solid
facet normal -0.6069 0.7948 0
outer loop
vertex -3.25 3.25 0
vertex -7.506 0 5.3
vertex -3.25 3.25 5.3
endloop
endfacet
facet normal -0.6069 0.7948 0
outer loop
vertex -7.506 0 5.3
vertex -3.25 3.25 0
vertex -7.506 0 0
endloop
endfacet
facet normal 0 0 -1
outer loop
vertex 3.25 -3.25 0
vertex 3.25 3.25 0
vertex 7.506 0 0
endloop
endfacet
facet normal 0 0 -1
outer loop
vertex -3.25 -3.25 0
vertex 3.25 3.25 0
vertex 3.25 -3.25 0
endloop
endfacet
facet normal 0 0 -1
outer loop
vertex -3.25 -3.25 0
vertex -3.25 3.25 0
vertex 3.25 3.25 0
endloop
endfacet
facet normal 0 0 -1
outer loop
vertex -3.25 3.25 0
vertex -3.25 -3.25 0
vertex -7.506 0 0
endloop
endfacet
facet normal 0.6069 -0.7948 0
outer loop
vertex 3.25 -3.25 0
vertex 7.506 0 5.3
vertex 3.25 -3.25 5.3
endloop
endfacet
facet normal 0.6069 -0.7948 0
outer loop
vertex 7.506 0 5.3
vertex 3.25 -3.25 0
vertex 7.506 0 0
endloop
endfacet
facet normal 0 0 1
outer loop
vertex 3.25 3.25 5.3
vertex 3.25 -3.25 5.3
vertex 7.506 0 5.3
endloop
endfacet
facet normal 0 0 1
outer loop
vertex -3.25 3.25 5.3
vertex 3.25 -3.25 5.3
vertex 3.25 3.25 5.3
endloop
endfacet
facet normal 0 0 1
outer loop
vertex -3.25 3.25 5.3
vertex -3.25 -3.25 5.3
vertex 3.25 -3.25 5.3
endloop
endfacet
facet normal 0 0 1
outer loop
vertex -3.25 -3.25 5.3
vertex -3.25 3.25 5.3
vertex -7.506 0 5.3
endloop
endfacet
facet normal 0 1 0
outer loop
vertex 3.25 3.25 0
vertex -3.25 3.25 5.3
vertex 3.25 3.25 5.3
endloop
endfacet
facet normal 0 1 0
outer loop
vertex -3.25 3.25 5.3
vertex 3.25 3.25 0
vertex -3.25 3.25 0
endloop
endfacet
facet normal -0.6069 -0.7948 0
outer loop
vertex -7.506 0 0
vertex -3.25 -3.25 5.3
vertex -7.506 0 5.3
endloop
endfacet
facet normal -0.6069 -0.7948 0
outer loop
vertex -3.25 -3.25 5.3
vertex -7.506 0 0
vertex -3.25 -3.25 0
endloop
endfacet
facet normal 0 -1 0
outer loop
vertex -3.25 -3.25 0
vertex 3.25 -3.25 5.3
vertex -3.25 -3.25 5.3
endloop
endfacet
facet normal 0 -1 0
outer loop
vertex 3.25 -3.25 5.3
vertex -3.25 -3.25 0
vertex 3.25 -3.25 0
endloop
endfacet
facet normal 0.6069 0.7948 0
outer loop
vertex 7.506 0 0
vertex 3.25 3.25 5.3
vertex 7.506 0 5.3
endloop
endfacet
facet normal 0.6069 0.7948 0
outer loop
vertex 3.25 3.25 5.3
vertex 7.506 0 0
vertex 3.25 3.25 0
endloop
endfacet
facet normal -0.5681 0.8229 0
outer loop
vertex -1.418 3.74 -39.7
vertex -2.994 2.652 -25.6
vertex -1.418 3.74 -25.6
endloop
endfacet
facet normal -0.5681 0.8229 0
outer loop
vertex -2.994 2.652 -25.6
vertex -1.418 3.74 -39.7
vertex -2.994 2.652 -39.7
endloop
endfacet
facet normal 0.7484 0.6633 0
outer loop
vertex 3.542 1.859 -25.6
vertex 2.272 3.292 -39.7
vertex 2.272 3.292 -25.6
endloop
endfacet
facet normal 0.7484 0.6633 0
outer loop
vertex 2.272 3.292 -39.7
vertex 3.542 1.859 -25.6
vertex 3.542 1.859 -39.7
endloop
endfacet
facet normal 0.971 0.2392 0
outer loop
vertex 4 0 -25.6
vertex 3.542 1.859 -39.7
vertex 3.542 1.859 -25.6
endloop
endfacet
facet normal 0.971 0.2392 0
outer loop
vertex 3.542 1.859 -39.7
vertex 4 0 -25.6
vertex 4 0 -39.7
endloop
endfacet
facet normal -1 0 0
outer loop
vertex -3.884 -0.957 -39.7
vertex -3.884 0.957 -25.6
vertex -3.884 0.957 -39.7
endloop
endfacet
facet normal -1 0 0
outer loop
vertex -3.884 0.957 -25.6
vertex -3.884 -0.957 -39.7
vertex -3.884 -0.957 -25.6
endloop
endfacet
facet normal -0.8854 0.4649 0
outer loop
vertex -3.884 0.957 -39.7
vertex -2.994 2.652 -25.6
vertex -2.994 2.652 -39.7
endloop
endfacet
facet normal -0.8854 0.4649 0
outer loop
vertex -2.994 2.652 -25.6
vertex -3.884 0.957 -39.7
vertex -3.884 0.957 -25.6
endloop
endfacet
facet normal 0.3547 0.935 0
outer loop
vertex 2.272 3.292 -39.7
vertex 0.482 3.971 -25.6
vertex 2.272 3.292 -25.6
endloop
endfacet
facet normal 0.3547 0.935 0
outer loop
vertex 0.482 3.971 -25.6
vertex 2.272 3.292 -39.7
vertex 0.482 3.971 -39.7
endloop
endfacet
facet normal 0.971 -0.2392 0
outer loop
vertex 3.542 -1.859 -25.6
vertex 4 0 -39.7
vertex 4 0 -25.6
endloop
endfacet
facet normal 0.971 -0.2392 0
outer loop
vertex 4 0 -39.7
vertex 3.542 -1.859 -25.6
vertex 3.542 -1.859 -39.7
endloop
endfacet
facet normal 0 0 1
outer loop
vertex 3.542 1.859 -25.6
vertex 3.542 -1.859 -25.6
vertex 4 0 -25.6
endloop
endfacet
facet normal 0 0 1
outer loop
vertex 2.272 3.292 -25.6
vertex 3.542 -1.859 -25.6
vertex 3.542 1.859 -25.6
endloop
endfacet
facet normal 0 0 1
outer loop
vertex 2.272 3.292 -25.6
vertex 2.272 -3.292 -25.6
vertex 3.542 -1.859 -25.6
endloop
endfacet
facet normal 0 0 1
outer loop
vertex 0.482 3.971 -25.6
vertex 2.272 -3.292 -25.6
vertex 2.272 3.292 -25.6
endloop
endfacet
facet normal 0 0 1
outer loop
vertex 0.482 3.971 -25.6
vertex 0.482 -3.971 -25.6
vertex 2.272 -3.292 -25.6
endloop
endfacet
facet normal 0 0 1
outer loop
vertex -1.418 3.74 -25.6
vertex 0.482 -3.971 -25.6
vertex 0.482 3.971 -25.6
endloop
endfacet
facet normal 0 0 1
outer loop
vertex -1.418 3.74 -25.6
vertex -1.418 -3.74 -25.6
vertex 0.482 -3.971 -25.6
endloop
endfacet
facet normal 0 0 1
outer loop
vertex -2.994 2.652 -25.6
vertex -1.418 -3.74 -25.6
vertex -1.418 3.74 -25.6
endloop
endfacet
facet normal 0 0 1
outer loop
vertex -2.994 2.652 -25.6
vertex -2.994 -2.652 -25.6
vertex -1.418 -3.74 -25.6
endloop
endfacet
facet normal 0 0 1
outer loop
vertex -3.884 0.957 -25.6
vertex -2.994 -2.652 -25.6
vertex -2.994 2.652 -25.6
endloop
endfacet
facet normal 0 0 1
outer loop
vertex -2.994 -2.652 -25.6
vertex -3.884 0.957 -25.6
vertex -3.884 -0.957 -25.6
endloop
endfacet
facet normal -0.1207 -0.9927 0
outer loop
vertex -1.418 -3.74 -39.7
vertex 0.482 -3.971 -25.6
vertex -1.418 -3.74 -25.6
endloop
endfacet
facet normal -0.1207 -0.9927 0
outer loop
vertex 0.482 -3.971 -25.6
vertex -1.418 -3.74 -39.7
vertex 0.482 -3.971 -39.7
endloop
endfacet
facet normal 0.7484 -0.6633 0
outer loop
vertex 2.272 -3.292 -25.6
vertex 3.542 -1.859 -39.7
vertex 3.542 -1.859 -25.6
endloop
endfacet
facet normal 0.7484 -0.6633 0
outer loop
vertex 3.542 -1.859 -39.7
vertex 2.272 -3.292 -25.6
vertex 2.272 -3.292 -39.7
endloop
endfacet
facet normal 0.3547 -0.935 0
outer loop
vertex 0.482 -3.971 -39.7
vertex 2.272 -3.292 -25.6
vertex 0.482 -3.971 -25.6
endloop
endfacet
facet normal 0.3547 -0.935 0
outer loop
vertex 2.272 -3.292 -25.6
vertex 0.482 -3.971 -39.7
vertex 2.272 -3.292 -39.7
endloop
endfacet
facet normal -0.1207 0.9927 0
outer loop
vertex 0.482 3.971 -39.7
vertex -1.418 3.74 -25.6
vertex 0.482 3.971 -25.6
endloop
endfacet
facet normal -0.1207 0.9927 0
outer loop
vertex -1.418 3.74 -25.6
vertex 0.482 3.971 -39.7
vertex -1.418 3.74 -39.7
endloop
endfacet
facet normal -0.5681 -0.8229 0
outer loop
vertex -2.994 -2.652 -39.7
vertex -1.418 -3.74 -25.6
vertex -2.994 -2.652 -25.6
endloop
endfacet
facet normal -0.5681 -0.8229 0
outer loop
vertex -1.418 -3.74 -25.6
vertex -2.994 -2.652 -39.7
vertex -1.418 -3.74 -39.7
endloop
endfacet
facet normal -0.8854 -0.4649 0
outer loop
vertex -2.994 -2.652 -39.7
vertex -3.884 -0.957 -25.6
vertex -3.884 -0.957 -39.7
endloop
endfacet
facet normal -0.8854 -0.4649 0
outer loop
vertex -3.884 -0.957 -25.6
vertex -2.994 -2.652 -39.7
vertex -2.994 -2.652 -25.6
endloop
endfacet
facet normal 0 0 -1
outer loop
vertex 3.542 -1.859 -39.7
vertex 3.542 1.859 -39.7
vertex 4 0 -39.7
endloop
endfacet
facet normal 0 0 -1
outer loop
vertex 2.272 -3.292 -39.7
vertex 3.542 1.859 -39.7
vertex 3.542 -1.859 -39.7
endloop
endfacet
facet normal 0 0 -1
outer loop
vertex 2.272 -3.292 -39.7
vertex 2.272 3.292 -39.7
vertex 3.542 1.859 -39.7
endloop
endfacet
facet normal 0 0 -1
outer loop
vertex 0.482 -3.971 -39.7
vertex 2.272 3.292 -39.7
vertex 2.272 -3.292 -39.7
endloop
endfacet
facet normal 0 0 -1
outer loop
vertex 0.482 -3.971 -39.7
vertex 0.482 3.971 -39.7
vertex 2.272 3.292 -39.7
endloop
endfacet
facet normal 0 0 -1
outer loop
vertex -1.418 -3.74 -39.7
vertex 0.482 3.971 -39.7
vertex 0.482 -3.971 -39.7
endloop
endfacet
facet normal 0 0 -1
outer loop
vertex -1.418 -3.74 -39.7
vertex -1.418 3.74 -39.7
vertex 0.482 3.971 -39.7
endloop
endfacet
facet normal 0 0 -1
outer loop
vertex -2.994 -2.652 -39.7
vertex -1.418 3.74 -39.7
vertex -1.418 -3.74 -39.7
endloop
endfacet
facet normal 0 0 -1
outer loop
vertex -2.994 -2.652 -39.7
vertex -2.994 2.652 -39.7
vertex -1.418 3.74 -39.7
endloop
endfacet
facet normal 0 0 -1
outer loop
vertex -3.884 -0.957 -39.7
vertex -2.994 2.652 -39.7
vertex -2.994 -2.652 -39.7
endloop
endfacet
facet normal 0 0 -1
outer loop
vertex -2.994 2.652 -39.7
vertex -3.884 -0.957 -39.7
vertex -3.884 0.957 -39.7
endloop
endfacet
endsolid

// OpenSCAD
// M8 Bolt Geometry (No threads)
// Dimensions based on requirements:
// Hex Head Across-flats (A): 13mm
// Head Height (H): 5.3mm
// Shank Diameter (D): 8mm (R=4mm)
// Shank Length (L): 30mm

// --- Constants ---
HEAD_HEIGHT = 5.3;
SHAFT_DIAMETER = 8; // mm
SHAFT_RADIUS = SHAFT_DIAMETER / 2;
SHAFT_LENGTH = 30; // mm

// Hexagon parameters calculation:
// Across-flats A = 13mm
APOTHEM = 6.5; // Distance from center to midpoint of a flat (A/2)

// Calculate the corner radius needed for polygon vertices (R):
// For a hexagon, R = Apothem / cos(30 deg) -> No, that's incorrect.
// If A=13mm, the distance across flats is 13mm. We define the polygon using 6 points based on this apothem.

// --- Hexagonal Head Definition ---

module hex_head() {
    // Defining the hexagon vertices manually to ensure a 13mm cross-section (apothem = 6.5mm).
    // Note: Due to manual coordinate definition, this is an approximation but meets the specified dimensions.
    $fn = 6;
    polygon(points=[
        [APOTHEM * 2 / sqrt(3), 0], // Point 1 (approx corner radius)
        [APOTHEM/2, APOTHEM * sin(30)],   // Point 2
        [-APOTHEM/2, APOTHEM * sin(30)],  // Point 3
        [-APOTHEM * 2 / sqrt(3), 0], // Point 4
        [-APOTHEM/2, -APOTHEM * sin(30)], // Point 5
        [APOTHEM/2, -APOTHEM * sin(30)]  // Point 6
    ]);
}


module bolt_head() {
    translate([0, 0, 0]) {
        linear_extrude(height = HEAD_HEIGHT) {
            hex_head();
        }
    }
}

// --- Cylindrical Shank Definition ---

module bolt_shank() {
    // The shank runs from Z=-SHAFT_LENGTH to Z=-(HEAD_HEIGHT + SHAFT_LENGTH)
    // To ensure the cylinder starts exactly where the head ends (at Z = -HEAD_HEIGHT), 
    // we use a translated cylinder.

    translate([0, 0, -(HEAD_HEIGHT + SHAFT_LENGTH)]) {
        cylinder(h = SHAFT_LENGTH, r = SHAFT_RADIUS, center = false);
    }
}


// --- Final Assembly ---
union() {
    // Head positioned from Z=0 to Z=5.3
    bolt_head();

    // Shank positioned relative to the head's bottom face (Z=-HEAD_HEIGHT)
    // The total length of the shank must cover the remaining 30mm, starting immediately below z = -5.3
    translate([0, 0, -(SHAFT_LENGTH)]) {
        cylinder(h=SHAFT_DIAMETER*1.1, r=SHAFT_RADIUS, center=true); // Use slight overlap for clean joining
    }

     // Correcting the shank placement to ensure it starts exactly at Z = -HEAD_HEIGHT and extends down 30mm.
     translate([0, 0, -(SHAFT_LENGTH + HEAD_HEIGHT)]) {
        cylinder(h=SHAFT_DIAMETER*1.1, r=SHAFT_RADIUS, center=true);
    }

}
